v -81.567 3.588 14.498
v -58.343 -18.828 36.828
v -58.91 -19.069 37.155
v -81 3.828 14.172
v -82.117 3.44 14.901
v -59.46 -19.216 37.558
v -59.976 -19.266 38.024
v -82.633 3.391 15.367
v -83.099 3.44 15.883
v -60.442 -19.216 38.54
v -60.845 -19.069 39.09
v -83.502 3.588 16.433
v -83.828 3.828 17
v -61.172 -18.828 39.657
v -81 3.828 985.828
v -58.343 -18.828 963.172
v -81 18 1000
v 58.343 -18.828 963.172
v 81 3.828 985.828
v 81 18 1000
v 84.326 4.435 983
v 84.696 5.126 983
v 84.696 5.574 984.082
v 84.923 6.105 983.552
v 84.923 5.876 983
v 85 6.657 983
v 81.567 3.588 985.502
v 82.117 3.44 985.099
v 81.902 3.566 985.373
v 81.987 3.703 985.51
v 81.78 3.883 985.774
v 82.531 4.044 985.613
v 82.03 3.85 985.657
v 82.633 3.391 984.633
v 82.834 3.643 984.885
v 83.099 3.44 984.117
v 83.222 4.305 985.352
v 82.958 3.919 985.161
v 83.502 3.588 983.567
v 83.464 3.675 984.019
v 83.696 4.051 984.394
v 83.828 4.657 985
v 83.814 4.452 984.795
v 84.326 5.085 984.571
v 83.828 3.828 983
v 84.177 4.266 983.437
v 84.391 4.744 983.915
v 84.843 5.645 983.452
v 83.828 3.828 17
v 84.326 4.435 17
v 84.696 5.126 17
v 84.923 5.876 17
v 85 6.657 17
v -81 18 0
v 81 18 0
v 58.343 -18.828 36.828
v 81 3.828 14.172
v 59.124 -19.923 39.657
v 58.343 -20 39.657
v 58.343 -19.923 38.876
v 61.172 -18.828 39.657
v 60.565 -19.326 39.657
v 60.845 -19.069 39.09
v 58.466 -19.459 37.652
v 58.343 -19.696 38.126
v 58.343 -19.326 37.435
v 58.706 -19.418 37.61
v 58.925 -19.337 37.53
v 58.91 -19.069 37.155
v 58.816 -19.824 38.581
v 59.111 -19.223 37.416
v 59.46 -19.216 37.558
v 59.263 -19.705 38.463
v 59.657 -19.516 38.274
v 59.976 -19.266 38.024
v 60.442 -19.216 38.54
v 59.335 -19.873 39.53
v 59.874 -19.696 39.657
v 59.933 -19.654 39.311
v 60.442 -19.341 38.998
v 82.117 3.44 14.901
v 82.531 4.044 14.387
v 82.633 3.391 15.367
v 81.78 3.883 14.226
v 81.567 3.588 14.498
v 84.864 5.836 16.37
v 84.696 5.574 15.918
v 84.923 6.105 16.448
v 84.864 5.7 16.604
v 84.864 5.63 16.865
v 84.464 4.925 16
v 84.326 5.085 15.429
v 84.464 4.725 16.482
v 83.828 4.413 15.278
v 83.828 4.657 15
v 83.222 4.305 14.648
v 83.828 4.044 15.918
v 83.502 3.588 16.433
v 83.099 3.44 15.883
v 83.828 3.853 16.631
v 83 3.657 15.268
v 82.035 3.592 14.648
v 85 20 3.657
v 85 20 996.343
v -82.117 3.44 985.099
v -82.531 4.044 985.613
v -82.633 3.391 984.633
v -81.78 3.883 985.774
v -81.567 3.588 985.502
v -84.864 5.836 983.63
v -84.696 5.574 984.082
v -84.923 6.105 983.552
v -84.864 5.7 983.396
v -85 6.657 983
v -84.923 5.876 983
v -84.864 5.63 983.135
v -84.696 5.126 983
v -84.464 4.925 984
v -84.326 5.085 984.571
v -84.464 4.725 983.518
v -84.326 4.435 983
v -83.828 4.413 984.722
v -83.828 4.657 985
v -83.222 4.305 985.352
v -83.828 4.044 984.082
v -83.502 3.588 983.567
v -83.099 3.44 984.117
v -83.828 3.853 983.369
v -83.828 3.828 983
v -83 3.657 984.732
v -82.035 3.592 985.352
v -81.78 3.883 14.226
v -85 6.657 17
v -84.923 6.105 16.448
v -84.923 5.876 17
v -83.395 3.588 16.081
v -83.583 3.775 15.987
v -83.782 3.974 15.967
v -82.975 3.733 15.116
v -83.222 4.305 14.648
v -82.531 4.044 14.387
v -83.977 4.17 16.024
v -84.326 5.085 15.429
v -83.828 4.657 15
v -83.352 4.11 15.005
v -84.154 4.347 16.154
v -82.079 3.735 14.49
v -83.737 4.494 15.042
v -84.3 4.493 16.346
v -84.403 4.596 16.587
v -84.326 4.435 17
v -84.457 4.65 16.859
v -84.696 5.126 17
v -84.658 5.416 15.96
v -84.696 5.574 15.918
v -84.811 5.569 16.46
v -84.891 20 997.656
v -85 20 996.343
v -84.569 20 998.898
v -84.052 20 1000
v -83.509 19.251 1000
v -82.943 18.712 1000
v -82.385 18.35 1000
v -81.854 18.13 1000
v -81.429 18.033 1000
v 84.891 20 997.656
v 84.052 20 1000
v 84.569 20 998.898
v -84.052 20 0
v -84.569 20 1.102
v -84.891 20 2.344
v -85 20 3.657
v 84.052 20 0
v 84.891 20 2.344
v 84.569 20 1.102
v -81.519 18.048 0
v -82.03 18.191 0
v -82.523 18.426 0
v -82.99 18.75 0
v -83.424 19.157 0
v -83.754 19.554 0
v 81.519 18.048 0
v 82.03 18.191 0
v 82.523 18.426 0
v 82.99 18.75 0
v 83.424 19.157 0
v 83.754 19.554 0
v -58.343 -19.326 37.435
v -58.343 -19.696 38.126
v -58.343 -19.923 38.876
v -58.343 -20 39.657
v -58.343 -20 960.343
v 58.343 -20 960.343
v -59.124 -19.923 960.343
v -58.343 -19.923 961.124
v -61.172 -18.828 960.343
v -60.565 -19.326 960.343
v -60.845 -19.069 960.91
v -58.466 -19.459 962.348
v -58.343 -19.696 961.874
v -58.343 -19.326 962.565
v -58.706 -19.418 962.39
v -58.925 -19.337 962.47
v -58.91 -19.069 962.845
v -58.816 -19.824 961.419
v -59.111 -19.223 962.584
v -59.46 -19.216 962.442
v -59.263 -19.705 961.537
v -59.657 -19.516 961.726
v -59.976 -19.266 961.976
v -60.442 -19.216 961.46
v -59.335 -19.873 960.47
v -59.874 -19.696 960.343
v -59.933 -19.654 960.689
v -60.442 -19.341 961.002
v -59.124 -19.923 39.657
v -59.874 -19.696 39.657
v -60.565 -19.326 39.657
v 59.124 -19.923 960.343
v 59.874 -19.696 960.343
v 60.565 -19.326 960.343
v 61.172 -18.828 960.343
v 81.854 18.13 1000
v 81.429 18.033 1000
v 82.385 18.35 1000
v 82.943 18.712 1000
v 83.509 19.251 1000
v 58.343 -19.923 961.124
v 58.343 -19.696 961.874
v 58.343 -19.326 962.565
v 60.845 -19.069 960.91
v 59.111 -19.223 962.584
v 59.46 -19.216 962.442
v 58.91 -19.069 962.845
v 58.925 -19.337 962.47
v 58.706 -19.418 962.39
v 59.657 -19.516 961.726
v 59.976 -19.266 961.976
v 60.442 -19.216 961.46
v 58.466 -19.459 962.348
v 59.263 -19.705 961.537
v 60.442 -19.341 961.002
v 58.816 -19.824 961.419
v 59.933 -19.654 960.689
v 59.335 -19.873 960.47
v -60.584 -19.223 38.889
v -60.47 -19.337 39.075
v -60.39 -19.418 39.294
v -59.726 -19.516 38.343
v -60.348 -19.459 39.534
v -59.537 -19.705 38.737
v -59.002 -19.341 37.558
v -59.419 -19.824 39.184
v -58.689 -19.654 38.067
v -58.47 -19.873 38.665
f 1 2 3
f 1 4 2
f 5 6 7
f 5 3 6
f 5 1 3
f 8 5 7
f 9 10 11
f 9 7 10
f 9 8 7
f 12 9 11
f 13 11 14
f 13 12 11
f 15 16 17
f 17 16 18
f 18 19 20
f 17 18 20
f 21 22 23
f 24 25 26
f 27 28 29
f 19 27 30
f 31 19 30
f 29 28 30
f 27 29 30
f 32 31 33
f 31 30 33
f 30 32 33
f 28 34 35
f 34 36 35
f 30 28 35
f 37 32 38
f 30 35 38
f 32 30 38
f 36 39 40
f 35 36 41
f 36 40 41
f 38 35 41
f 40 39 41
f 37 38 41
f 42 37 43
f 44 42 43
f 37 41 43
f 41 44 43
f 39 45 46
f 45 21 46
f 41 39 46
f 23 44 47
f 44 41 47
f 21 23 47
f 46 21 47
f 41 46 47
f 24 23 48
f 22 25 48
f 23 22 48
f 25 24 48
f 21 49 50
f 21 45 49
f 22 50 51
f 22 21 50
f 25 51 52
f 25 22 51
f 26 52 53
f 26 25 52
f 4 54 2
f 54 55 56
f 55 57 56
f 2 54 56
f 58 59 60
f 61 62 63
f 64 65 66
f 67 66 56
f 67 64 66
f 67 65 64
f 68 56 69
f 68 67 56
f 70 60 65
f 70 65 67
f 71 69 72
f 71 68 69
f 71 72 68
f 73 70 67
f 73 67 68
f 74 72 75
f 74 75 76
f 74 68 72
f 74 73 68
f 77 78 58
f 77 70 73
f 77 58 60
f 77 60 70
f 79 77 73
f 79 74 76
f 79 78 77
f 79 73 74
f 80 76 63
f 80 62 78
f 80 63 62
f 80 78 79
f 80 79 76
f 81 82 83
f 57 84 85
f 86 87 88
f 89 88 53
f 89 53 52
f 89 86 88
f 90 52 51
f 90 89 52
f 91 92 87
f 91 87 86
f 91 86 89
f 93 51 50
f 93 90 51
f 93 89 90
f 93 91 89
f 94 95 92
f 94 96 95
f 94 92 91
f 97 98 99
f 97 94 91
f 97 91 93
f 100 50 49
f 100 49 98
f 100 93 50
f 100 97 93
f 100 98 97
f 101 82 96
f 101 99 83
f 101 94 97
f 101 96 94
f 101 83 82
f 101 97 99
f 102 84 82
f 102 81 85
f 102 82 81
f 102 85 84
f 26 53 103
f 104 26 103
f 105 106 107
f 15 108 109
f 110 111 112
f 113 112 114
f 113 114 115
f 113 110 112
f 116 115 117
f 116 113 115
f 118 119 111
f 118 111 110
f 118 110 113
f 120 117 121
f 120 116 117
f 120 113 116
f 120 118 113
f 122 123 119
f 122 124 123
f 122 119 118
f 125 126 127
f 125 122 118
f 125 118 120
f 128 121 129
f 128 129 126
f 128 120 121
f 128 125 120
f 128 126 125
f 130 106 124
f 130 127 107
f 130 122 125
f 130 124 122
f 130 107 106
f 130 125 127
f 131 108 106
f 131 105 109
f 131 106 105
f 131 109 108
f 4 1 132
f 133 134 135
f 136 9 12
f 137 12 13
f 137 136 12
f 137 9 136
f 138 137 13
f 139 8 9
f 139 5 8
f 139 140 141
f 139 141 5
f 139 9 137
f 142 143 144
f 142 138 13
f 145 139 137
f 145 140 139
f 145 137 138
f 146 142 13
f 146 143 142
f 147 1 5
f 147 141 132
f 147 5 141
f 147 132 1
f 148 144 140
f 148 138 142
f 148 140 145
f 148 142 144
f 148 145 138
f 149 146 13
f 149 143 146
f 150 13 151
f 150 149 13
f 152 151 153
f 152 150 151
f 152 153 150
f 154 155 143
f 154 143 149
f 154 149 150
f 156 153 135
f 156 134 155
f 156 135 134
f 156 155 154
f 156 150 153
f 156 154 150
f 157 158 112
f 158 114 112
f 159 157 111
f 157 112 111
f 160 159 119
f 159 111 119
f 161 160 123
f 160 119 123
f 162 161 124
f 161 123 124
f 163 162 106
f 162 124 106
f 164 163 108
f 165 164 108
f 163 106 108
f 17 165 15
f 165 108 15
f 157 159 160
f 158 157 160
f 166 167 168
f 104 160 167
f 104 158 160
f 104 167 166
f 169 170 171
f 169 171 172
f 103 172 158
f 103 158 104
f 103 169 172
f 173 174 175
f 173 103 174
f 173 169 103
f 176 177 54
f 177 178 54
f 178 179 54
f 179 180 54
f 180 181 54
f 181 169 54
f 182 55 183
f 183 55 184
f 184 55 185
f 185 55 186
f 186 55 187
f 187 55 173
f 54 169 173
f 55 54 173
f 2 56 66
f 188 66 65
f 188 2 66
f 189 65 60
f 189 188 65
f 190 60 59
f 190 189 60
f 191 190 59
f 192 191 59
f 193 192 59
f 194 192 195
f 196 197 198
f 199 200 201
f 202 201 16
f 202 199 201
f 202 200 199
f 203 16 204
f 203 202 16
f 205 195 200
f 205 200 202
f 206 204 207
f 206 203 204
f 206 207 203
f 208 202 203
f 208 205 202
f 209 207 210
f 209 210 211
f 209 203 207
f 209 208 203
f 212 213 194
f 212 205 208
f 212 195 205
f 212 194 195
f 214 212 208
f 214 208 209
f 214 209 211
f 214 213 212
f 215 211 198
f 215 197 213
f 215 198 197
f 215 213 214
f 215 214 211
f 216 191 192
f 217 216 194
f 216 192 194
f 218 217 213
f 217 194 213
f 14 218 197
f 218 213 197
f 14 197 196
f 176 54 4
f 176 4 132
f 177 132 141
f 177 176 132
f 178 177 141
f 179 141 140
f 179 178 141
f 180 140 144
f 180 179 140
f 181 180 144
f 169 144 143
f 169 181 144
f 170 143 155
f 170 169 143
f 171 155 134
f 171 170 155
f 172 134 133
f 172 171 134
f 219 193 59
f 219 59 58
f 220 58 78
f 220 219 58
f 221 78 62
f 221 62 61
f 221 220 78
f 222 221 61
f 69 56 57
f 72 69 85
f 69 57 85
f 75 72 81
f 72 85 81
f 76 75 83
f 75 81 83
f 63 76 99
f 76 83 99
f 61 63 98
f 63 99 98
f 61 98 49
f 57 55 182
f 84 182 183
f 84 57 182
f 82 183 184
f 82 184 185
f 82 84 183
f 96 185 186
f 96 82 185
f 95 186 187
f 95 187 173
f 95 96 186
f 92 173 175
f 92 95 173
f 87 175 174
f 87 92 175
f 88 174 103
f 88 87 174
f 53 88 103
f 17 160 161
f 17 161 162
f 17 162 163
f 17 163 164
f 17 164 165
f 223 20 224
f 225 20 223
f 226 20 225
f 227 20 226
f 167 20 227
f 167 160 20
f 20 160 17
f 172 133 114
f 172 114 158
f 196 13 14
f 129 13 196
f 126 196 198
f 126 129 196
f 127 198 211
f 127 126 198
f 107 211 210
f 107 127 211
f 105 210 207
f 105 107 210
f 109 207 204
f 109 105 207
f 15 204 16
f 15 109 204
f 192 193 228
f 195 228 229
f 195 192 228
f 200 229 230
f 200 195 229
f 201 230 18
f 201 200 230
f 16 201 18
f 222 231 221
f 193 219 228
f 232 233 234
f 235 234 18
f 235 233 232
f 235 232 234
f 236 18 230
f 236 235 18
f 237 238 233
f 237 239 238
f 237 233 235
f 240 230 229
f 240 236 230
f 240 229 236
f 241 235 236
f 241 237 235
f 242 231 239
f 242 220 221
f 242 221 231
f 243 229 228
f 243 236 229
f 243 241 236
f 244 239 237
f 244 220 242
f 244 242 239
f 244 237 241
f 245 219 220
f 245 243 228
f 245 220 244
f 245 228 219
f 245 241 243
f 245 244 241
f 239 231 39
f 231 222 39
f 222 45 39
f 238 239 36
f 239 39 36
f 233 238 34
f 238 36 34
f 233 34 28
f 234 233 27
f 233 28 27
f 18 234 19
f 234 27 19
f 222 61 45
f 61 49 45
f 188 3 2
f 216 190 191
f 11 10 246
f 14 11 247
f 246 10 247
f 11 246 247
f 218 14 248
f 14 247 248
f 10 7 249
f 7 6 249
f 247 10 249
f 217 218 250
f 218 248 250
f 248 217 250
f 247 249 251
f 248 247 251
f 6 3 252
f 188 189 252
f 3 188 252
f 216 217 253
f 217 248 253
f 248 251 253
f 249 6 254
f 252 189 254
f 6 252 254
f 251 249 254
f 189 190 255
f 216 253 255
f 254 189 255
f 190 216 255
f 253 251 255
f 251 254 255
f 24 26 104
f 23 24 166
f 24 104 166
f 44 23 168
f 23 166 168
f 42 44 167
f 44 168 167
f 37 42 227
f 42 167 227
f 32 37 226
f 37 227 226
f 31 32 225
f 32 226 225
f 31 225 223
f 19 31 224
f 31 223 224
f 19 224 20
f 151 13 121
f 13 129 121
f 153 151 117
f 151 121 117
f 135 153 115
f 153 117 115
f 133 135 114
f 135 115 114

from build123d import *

# Parameters (mm, degrees)
F0_W     = 170
F0_H     = 40
F1_DEPTH = 1000
F3_DEPTH = 170.001
F4_SIZE2 = 25
F4_SIZE  = 25
F5_SIZE2 = 25
F5_SIZE  = 25
F6_R     = 4


with BuildPart() as f1:
    # F0 (on Top) → F1 (new body)
    with BuildSketch(Plane.XY):
        Rectangle(F0_W, F0_H)
    extrude(amount=F1_DEPTH)

    # F2 (on face) → F3 (cut, through all)
    with BuildSketch(Plane.YZ.offset(85)):
        Polygon((-20, 0), (18, 0), (-20, 38), align=None)
        Polygon((-20, 962), (18, 1000), (-20, 1000), align=None)
    extrude(amount=-F3_DEPTH, mode=Mode.SUBTRACT)

    # F4
    f4_edges = [f1.edges().sort_by_distance(p)[0] for p in [
        (85, -20, 500),
    ]]
    chamfer(f4_edges, length=F4_SIZE, length2=F4_SIZE2)

    # F5
    f5_edges = [f1.edges().sort_by_distance(p)[0] for p in [
        (-85, -20, 500),
    ]]
    chamfer(f5_edges, length=F5_SIZE, length2=F5_SIZE2)

    # F6
    f6_edges = [f1.edges().sort_by_distance(p)[0] for p in [
        (60, -20, 500),
        (0, -20, 38),
        (72.5, -7.5, 25.5),
        (85, 11.5, 6.5),
        (85, 5, 500),
        (-85, 11.5, 6.5),
        (-72.5, -7.5, 25.5),
        (-60, -20, 500),
        (72.5, -7.5, 974.5),
        (0, -20, 962),
        (85, 11.5, 993.5),
        (-72.5, -7.5, 974.5),
        (-85, 11.5, 993.5),
        (-85, 5, 500),
    ]]
    fillet(f6_edges, radius=F6_R)


solid = f1.part
